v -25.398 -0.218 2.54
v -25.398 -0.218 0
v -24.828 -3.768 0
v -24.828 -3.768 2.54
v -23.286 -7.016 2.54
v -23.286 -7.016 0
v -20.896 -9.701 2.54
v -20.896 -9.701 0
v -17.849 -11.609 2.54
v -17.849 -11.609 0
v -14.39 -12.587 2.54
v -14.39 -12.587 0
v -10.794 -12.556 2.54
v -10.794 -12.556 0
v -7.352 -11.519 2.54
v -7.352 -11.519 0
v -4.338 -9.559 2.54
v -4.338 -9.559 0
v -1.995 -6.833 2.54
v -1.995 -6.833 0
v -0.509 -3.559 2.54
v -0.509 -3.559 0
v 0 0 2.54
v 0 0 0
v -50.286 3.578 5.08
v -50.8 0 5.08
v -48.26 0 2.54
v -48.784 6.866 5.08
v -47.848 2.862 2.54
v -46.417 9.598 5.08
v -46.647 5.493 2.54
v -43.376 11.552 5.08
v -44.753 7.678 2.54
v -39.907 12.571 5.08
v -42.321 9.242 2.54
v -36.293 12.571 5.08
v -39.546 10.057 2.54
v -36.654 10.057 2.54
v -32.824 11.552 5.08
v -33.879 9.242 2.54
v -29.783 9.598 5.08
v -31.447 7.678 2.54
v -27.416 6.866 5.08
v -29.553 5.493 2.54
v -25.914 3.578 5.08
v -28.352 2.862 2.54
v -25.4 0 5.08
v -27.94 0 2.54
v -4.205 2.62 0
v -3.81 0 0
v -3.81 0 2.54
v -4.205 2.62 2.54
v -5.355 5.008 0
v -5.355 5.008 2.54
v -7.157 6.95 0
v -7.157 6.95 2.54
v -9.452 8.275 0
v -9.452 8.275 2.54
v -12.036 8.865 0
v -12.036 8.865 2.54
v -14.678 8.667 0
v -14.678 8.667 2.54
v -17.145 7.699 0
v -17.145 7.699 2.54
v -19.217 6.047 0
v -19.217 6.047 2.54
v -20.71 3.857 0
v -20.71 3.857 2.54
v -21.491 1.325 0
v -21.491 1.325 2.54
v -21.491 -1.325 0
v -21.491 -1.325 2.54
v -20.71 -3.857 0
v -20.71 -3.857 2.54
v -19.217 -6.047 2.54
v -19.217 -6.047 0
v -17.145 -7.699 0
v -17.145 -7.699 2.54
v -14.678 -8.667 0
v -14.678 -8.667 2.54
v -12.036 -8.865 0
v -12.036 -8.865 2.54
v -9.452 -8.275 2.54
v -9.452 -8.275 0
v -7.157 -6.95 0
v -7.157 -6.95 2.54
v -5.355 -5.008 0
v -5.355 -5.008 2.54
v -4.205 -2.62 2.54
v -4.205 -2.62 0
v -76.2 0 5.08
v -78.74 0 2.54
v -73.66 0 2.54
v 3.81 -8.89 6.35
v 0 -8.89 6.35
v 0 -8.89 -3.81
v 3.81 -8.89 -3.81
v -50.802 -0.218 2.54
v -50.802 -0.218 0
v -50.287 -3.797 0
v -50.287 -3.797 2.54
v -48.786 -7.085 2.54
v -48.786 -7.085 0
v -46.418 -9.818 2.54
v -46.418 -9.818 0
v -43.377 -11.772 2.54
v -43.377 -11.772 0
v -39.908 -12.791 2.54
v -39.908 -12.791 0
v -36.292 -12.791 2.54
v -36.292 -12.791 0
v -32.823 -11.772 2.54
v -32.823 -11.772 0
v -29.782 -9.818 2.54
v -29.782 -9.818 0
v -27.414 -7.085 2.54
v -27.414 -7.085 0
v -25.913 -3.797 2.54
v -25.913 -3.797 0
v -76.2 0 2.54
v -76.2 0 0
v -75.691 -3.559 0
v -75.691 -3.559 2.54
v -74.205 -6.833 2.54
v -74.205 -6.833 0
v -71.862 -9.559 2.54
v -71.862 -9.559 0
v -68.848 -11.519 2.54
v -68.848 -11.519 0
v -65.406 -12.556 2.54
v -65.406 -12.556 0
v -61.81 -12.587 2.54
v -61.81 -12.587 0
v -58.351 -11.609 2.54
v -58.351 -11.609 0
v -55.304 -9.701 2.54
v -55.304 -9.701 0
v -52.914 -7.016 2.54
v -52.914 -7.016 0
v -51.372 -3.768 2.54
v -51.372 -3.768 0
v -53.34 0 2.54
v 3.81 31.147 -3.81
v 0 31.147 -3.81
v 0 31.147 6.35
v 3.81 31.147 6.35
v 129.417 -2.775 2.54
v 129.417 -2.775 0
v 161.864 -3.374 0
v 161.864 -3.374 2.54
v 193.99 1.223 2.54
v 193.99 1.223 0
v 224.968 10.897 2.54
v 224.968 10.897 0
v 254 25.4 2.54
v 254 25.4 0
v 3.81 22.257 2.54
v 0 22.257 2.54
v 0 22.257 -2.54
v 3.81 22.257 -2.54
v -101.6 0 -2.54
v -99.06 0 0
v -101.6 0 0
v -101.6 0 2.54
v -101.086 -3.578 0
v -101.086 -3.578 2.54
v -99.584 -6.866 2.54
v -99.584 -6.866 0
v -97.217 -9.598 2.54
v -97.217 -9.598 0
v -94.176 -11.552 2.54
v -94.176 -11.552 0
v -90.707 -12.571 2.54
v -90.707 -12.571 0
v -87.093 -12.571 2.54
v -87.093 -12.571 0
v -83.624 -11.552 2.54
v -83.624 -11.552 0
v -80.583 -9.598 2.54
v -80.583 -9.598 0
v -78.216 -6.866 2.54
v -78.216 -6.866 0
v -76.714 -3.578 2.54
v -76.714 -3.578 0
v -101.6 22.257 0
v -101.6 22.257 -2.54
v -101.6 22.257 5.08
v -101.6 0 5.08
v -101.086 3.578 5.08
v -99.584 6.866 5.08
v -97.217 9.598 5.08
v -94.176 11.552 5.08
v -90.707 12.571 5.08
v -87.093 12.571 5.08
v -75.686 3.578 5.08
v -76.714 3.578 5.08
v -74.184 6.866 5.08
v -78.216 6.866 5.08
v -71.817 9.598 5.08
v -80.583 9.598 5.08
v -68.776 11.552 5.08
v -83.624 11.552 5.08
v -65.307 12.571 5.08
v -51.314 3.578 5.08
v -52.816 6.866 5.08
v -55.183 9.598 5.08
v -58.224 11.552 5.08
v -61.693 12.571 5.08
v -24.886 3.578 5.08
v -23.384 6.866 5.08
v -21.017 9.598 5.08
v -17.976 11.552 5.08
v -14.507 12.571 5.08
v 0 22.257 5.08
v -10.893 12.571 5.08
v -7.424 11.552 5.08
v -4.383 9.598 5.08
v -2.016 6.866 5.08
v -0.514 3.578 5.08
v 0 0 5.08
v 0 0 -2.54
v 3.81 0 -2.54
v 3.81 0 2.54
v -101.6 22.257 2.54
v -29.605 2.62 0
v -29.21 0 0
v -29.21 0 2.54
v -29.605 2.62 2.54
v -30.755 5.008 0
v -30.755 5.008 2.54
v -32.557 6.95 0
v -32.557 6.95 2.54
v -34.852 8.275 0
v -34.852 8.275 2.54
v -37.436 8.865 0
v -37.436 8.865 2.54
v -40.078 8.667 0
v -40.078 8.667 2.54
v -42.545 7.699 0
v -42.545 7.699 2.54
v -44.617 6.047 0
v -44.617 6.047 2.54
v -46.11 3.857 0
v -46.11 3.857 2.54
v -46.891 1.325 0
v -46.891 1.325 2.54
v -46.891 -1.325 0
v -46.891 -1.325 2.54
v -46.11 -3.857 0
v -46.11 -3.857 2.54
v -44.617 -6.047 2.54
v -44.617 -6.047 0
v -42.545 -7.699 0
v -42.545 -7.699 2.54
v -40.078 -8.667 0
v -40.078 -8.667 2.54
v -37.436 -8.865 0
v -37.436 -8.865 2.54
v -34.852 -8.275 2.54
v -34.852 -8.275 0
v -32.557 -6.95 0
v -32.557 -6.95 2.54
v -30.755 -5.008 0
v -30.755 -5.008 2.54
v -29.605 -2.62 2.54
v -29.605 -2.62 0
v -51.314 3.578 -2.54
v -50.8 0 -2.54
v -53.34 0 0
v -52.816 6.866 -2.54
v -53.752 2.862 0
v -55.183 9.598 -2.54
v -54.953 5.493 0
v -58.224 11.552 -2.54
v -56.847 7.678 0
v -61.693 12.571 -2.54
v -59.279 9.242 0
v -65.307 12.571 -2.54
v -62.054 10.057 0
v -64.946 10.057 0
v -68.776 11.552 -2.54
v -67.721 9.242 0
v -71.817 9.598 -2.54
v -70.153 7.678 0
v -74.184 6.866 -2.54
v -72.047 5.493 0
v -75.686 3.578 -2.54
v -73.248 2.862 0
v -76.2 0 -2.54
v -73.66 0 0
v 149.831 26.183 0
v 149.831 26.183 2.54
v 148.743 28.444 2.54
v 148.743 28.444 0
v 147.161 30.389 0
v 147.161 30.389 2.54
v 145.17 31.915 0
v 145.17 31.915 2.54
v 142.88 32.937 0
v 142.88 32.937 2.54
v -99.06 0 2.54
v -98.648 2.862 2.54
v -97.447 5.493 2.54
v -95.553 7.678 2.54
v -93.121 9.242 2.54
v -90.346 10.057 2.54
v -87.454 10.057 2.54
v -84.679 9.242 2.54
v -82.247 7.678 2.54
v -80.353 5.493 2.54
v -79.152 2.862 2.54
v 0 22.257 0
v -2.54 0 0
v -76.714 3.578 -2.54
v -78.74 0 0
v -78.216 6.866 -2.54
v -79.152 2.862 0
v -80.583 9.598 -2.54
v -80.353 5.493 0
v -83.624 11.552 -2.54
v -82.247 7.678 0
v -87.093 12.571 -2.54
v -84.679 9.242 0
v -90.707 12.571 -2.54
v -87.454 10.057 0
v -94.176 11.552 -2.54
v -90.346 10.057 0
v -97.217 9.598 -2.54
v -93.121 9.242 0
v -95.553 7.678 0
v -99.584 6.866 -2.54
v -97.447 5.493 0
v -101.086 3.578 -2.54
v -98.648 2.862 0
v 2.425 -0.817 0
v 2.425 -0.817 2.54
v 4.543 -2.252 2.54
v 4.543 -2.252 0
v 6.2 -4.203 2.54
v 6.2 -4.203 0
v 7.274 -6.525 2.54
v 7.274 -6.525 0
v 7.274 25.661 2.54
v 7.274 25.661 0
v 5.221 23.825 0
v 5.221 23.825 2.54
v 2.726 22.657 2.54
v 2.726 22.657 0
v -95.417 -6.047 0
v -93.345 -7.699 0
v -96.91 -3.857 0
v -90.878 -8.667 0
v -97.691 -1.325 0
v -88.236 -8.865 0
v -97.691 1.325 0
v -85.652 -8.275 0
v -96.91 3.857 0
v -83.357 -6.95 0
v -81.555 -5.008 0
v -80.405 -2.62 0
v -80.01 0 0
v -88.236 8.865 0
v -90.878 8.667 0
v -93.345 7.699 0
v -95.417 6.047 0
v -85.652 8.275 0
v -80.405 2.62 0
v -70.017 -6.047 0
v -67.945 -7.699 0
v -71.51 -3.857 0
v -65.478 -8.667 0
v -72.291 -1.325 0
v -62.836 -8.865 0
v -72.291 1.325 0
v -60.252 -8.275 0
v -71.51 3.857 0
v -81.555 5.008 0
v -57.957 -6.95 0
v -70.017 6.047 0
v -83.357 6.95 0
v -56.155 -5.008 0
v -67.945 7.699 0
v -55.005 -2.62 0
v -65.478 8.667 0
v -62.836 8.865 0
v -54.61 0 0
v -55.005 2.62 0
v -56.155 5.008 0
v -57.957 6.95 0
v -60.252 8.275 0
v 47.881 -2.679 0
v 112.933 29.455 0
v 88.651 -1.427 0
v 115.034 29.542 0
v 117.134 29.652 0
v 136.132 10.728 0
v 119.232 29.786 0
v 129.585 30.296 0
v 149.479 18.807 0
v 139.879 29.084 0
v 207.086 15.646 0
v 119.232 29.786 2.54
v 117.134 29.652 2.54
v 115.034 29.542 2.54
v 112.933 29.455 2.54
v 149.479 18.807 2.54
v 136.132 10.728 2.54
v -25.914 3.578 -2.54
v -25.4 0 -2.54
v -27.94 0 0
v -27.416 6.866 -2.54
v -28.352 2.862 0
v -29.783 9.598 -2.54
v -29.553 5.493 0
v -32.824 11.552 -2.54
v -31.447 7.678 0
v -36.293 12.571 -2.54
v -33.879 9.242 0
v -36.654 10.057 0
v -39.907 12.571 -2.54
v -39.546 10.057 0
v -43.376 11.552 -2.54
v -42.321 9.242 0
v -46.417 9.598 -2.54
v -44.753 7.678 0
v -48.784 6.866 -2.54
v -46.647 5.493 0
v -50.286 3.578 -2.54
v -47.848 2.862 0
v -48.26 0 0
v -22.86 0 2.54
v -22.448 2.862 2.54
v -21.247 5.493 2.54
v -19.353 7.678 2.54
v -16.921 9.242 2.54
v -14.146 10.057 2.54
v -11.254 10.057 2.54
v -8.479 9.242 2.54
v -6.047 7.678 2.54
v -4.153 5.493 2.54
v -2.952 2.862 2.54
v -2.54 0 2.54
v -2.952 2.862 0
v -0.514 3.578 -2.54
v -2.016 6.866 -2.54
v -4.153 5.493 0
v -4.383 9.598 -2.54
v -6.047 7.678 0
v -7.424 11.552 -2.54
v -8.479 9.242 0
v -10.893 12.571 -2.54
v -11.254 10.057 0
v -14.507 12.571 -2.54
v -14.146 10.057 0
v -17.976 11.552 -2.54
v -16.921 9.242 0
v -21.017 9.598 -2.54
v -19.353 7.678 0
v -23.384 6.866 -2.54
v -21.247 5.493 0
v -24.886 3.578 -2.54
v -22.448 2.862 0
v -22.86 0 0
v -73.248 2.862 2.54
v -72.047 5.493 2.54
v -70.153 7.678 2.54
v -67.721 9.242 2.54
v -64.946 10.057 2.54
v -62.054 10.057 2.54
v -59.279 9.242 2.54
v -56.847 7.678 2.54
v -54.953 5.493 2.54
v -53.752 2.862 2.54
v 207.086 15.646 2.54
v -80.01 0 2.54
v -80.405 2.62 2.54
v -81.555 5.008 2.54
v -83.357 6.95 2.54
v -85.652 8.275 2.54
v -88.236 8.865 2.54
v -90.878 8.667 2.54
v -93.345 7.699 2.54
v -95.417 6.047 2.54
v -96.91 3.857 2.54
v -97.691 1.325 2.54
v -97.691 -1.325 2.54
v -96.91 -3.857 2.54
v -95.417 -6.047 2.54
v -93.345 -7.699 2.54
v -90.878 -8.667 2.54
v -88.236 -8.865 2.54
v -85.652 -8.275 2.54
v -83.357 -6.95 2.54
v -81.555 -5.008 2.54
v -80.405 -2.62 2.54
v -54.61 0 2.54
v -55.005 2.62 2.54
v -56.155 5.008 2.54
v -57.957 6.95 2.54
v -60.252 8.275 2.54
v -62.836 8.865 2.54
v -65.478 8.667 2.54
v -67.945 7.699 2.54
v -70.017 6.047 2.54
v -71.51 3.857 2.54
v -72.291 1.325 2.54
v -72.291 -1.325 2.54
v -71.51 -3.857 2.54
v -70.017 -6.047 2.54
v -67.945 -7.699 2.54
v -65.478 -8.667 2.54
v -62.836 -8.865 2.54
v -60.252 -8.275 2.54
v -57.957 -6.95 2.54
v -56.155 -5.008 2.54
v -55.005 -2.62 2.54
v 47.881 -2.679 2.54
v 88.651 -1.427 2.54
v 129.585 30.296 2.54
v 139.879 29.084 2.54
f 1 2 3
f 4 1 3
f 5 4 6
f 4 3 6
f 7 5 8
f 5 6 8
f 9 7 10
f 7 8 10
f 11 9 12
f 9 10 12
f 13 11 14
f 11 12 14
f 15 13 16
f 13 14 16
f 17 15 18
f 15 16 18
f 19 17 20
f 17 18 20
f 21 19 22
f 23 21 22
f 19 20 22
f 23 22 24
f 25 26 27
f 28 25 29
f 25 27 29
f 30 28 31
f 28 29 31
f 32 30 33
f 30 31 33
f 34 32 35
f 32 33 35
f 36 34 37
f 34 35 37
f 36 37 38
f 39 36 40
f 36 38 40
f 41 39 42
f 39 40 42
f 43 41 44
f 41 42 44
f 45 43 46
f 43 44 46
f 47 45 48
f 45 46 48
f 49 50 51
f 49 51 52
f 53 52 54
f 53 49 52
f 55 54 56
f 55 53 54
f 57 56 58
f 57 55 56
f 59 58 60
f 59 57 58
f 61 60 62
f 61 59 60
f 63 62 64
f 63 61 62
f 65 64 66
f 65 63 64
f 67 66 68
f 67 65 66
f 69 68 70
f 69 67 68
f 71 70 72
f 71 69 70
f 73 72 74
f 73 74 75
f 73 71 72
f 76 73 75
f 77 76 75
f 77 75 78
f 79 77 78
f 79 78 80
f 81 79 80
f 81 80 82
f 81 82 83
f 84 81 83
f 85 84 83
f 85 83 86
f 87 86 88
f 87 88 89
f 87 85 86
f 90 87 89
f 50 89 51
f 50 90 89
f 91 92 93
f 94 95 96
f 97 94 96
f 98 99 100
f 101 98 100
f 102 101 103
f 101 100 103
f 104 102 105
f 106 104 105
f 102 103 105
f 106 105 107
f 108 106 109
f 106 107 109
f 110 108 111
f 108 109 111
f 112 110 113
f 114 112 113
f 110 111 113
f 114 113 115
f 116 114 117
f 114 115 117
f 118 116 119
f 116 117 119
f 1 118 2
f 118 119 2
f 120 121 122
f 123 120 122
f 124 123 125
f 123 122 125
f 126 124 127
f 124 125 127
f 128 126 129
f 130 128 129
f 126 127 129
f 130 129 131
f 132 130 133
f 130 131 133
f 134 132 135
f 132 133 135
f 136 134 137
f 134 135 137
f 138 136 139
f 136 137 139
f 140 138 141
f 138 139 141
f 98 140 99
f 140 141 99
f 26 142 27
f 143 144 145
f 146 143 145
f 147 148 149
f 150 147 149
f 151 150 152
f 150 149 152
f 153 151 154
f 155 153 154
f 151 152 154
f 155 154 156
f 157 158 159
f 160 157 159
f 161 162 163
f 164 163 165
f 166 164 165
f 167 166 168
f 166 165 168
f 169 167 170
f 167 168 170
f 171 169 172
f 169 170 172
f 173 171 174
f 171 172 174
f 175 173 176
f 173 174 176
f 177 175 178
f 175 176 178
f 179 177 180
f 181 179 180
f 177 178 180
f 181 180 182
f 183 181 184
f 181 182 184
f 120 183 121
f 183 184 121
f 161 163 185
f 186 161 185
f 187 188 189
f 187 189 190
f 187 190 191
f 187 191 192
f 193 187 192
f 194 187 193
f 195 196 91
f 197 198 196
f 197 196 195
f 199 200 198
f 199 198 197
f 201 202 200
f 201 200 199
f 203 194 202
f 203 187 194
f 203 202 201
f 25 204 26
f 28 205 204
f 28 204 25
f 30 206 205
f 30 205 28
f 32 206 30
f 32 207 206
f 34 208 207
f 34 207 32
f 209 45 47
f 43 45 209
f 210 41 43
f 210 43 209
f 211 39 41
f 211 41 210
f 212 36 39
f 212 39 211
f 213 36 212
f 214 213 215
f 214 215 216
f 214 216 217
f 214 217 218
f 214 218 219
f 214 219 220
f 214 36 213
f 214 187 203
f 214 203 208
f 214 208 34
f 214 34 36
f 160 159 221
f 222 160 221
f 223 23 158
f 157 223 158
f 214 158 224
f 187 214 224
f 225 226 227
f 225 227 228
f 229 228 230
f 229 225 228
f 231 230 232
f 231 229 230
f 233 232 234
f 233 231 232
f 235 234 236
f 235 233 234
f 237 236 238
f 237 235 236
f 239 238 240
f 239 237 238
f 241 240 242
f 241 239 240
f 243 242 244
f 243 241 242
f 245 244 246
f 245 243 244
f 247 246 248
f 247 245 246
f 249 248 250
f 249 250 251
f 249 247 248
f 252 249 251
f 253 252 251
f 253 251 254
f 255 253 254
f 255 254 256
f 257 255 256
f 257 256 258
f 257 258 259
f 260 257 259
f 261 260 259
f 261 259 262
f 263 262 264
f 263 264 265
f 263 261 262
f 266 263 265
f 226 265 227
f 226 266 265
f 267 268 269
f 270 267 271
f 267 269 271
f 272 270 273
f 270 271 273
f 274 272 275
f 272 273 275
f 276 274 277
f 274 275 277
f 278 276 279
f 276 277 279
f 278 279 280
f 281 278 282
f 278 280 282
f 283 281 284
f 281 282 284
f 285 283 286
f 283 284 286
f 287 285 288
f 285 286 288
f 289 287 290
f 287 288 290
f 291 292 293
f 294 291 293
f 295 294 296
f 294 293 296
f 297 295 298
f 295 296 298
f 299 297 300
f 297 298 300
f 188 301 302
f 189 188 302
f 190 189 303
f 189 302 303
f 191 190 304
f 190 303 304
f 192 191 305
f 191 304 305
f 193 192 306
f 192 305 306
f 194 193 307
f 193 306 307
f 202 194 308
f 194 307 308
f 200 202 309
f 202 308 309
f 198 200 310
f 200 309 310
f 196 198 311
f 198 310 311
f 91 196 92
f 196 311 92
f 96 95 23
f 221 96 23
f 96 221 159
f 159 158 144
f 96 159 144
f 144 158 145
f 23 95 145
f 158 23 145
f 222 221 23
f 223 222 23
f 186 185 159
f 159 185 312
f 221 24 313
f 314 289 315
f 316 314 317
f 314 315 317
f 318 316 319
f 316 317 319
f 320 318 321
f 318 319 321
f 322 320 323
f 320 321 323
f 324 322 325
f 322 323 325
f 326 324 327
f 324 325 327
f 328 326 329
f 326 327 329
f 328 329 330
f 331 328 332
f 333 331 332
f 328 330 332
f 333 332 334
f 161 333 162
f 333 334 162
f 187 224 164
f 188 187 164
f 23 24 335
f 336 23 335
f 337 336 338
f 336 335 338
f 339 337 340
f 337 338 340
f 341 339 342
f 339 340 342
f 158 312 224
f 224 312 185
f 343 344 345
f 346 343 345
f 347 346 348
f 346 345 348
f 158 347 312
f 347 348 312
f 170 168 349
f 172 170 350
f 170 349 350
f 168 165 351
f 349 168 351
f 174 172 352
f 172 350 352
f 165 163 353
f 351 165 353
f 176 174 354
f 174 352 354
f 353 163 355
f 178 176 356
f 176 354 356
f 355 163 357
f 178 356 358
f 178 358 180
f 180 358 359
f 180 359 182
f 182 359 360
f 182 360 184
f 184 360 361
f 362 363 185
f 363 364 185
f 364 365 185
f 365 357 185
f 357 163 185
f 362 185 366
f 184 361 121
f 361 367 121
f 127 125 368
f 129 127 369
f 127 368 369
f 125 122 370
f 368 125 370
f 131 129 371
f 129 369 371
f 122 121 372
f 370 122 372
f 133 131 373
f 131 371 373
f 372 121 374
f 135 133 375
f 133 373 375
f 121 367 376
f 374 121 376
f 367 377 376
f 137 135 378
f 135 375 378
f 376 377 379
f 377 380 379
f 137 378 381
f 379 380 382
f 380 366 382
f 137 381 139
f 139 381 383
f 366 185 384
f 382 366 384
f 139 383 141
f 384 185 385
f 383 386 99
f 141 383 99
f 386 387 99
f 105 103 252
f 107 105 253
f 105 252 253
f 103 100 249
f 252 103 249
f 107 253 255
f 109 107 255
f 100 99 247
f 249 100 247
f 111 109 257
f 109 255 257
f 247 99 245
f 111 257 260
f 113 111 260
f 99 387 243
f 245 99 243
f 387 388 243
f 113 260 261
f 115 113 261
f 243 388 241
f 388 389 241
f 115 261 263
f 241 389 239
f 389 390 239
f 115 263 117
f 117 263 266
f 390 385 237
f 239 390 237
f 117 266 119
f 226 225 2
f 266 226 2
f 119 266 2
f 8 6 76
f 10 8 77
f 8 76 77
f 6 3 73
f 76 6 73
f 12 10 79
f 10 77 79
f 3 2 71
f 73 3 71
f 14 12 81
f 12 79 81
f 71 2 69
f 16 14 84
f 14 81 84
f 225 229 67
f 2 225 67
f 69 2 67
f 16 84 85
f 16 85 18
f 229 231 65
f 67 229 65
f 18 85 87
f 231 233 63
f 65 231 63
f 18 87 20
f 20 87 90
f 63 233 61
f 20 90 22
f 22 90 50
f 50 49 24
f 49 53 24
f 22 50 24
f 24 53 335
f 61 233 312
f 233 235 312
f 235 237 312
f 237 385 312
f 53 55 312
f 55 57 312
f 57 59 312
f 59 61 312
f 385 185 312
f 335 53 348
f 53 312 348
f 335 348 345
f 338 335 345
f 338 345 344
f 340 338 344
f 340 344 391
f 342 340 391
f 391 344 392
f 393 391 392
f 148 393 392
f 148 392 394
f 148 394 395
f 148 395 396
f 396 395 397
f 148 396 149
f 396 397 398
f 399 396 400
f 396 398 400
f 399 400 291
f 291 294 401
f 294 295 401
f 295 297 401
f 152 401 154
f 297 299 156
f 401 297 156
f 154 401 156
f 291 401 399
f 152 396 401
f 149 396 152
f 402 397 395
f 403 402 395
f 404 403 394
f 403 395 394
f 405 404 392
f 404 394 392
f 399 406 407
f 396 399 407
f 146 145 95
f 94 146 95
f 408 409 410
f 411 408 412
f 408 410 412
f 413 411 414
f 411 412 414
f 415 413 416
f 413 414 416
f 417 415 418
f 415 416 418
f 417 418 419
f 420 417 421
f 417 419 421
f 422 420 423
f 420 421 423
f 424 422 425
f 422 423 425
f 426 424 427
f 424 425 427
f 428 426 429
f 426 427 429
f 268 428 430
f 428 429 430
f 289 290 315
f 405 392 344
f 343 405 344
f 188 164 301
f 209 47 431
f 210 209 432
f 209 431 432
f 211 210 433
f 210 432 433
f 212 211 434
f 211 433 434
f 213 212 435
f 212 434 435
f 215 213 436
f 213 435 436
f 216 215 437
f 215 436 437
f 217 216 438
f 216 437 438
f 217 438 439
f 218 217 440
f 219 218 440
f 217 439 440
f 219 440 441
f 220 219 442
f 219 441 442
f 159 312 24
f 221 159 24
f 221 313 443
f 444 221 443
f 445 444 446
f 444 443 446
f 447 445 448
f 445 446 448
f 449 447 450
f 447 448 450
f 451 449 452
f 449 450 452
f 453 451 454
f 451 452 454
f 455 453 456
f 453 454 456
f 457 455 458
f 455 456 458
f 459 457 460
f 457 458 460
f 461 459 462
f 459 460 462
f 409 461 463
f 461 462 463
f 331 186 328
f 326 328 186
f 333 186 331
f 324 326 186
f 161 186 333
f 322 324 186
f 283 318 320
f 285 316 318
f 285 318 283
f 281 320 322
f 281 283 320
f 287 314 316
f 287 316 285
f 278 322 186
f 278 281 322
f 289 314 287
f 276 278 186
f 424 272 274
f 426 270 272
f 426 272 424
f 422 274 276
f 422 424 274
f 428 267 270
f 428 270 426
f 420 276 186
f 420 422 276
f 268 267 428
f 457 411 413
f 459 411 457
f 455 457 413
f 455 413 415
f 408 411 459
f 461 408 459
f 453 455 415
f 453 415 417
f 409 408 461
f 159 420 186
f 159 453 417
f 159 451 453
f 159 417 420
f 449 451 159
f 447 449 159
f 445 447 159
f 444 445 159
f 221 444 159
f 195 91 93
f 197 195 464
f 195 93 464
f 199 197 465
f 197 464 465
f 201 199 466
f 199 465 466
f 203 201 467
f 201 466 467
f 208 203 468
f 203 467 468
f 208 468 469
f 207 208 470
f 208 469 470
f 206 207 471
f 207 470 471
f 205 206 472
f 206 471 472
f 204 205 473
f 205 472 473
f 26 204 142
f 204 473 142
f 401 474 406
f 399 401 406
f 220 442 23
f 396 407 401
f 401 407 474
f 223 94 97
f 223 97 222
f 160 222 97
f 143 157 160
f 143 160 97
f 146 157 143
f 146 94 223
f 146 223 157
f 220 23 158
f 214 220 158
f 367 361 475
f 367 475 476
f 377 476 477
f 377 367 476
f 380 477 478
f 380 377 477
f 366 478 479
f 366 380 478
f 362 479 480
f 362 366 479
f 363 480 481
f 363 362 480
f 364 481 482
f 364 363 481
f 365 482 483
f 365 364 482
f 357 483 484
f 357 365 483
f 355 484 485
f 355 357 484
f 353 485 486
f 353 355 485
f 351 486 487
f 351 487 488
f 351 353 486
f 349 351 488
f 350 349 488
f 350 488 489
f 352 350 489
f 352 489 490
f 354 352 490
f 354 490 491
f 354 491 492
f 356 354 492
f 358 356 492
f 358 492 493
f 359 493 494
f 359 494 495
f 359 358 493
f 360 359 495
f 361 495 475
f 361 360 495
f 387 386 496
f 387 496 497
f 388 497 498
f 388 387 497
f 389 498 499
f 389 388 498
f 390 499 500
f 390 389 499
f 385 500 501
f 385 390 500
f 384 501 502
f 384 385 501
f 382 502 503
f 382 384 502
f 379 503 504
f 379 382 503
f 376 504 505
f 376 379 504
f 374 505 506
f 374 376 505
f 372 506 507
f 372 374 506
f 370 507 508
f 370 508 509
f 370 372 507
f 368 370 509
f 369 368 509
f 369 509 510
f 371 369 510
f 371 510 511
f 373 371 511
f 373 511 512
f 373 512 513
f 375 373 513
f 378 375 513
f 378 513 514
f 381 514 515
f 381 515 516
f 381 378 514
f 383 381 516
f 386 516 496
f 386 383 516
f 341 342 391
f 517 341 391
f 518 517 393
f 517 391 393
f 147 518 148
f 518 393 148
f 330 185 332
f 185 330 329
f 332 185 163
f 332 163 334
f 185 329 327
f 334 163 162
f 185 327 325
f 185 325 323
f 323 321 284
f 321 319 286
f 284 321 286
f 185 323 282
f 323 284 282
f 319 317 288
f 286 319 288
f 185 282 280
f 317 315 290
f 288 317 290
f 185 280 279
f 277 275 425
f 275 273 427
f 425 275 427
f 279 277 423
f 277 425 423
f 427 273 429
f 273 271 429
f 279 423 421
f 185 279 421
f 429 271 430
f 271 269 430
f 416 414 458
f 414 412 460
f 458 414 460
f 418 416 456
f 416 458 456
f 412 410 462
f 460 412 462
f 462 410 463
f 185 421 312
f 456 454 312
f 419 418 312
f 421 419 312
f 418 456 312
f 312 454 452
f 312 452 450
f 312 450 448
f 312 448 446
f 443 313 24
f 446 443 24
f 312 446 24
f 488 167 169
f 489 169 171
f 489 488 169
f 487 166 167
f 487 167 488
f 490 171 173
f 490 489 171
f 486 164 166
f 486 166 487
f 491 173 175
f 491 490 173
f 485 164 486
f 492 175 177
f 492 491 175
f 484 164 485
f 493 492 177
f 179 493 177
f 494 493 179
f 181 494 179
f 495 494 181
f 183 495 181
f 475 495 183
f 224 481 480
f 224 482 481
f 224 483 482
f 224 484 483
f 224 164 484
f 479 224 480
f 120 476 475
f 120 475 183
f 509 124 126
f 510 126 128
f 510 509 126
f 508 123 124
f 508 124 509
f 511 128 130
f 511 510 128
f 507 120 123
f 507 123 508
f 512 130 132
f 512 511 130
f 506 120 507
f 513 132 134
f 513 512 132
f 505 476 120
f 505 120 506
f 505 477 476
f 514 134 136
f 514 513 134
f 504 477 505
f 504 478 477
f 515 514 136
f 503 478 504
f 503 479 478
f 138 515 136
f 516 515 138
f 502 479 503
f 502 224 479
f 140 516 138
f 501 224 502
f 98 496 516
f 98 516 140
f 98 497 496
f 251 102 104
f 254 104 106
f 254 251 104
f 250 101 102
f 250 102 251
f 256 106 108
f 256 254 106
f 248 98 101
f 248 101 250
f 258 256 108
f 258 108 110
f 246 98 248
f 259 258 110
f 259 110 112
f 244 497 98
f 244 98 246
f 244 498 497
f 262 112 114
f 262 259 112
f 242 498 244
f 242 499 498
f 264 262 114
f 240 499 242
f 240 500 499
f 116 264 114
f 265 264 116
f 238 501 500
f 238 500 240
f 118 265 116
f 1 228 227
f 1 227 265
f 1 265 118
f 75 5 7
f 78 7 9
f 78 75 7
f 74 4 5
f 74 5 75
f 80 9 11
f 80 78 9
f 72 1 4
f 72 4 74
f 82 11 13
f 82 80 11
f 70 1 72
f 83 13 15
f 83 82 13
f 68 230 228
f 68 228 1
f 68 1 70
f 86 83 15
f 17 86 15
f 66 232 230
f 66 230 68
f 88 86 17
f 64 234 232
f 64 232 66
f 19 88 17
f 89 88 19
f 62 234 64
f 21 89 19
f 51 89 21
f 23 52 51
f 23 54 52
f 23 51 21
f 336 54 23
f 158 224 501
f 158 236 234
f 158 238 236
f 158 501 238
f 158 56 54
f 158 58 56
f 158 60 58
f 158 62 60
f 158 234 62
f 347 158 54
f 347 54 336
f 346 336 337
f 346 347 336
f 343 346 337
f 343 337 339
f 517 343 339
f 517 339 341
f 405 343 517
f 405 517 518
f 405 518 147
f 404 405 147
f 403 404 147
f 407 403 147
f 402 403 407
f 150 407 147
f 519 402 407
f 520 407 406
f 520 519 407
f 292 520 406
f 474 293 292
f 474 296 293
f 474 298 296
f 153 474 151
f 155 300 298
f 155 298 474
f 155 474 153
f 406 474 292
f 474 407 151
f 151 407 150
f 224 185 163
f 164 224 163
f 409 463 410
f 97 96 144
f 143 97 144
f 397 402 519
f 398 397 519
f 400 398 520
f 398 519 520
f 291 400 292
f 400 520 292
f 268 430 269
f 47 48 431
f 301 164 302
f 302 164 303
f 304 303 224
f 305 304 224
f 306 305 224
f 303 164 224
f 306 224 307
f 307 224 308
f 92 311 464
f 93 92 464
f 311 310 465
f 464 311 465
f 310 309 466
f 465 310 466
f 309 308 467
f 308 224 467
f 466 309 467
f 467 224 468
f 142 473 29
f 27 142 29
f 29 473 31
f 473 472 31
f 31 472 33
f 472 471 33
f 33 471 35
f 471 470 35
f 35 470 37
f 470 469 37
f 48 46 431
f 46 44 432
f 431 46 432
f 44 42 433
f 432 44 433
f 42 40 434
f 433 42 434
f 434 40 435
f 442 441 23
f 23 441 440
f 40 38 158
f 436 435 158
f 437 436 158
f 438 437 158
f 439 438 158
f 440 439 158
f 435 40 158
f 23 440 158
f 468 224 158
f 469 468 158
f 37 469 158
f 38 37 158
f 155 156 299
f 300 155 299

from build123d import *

# Parameters (mm, degrees)
F0_R          = 8.89
F1_DEPTH      = 2.54
F3_DEPTH      = 25.4
F5_DEPTH      = 2.54
F7_DEPTH      = 2.54
F8_T2_ANGLE   = 306.5001793885
F8_T4_ANGLE   = 306.5001793885
F8_T6_ANGLE   = 306.5001793885
F8_T8_ANGLE   = 306.5001793885
F8_2_T2_ANGLE = 306.5001793885
F8_2_T4_ANGLE = 306.5001793885
F8_2_T6_ANGLE = 306.5001793885
F8_2_T8_ANGLE = 306.5001793885
F10_DEPTH     = 3.81


# Not quite as in the source:
# - a fillet or chamfer that OpenCascade refuses, or shapes differently, is made with other operations: its cross-section is extruded or revolved along the edge and cut away or added


with BuildPart() as f1:
    # F0 (on Top) → F1 (new body)
    with BuildSketch(Plane.XY):
        with BuildLine():
            Line((0, 22.2569602452), (0, 0))
            ThreePointArc((0, 0), (4.5429449248, -2.2524889562), (7.2743112207, -6.5246890036))
            ThreePointArc((7.2743112207, -6.5246890036), (68.2558827077, -1.7283700883), (129.4168248237, -2.7752204279))
            ThreePointArc((129.4168248237, -2.7752204279), (193.990196572, 1.2229597331), (254, 25.4))
            Line((254, 25.4), (142.8799988323, 32.9367792524))
            Line((142.8799988323, 32.9367792524), (119.2322895651, 29.7860647099))
            ThreePointArc((119.2322895651, 29.7860647099), (116.0841208365, 29.5940132977), (112.9331847352, 29.4545436828))
            Line((112.9331847352, 29.4545436828), (7.2743112207, 25.6611633832))
            ThreePointArc((7.2743112207, 25.6611633832), (4.0157254245, 23.1501104869), (0, 22.2569602452))
        make_face()
        with BuildLine():
            ThreePointArc((-25.3981255835, -0.218189517), (-12.5909012159, -12.6995313872), (0, 0))
            Line((0, 0), (0, 22.2569602452))
            Line((0, 22.2569602452), (-34.8408528237, 22.2569602452))
            ThreePointArc((-34.8408528237, 22.2569602452), (-50.8, 21.91440634), (-66.7591471763, 22.2569602452))
            Line((-66.7591471763, 22.2569602452), (-101.6, 22.2569602452))
            Line((-101.6, 22.2569602452), (-101.6, 0))
            ThreePointArc((-101.6, 0), (-88.9, -12.7), (-76.2, 0))
            ThreePointArc((-76.2, 0), (-63.6090987841, -12.6995313872), (-50.8018744165, -0.218189517))
            ThreePointArc((-50.8018744165, -0.218189517), (-38.1, -12.9200800362), (-25.3981255835, -0.218189517))
        make_face()
        with Locations((-88.9, 0)):
            Circle(F0_R, mode=Mode.SUBTRACT)
        with Locations((-63.5, 0)):
            Circle(F0_R, mode=Mode.SUBTRACT)
        with BuildLine():
            ThreePointArc((-50.8, 0), (-50.8004686128, -0.1090987841), (-50.8018744165, -0.218189517))
            ThreePointArc((-50.8018744165, -0.218189517), (-50.8014057346, -0.1090907335), (-50.8, 0))
        make_face(mode=Mode.SUBTRACT)
        with Locations((-38.1, 0)):
            Circle(F0_R, mode=Mode.SUBTRACT)
        with BuildLine():
            ThreePointArc((-25.4, 0), (-25.3985942654, -0.1090907335), (-25.3981255835, -0.218189517))
            ThreePointArc((-25.3981255835, -0.218189517), (-25.3995313872, -0.1090987841), (-25.4, 0))
        make_face(mode=Mode.SUBTRACT)
        with Locations((-12.7, 0)):
            Circle(F0_R, mode=Mode.SUBTRACT)
        with BuildLine():
            ThreePointArc((-66.7591471763, 22.2569602452), (-50.8, 21.91440634), (-34.8408528237, 22.2569602452))
            Line((-34.8408528237, 22.2569602452), (-66.7591471763, 22.2569602452))
        make_face()
        with BuildLine():
            ThreePointArc((-50.8, 0), (-50.8014057346, -0.1090907335), (-50.8018744165, -0.218189517))
            ThreePointArc((-50.8018744165, -0.218189517), (-50.8004686128, -0.1090987841), (-50.8, 0))
        make_face()
        with BuildLine():
            ThreePointArc((-25.4, 0), (-25.3995313872, -0.1090987841), (-25.3981255835, -0.218189517))
            ThreePointArc((-25.3981255835, -0.218189517), (-25.3985942654, -0.1090907335), (-25.4, 0))
        make_face()
    extrude(amount=F1_DEPTH)

    # F2 (on face) → F3 (cut)
    with BuildSketch(Plane.XY.offset(2.54)):
        with BuildLine():
            ThreePointArc((119.2322895651, 29.7860647099), (134.7574672595, 29.9044998636), (149.8305946589, 26.1834785342))
            ThreePointArc((149.8305946589, 26.1834785342), (147.1610546869, 30.3894267459), (142.8799988323, 32.9367792524))
            Line((142.8799988323, 32.9367792524), (119.2322895651, 29.7860647099))
        make_face()
        Polygon((207.085609436, 15.6457461417), (149.4793444872, 18.8070647418), (136.1315399408, 10.7281366363), align=None)
    extrude(amount=-F3_DEPTH, mode=Mode.SUBTRACT)


with BuildPart() as f5:
    # F4 (on face) → F5 (new body)
    with BuildSketch(Plane.XY.offset(2.54)):
        with BuildLine():
            Line((0, 0), (0, 22.2569602452))
            Line((0, 22.2569602452), (-101.6, 22.2569602452))
            Line((-101.6, 22.2569602452), (-101.6, 0))
            Line((-101.6, 0), (-97.79, 0))
            ThreePointArc((-97.79, 0), (-88.9, 8.89), (-80.01, 0))
            Line((-80.01, 0), (-76.2, 0))
            Line((-76.2, 0), (-72.39, 0))
            ThreePointArc((-72.39, 0), (-63.5, 8.89), (-54.61, 0))
            Line((-54.61, 0), (-46.99, 0))
            ThreePointArc((-46.99, 0), (-38.1, 8.89), (-29.21, 0))
            Line((-29.21, 0), (-21.59, 0))
            ThreePointArc((-21.59, 0), (-12.7, 8.89), (-3.81, 0))
            Line((-3.81, 0), (0, 0))
        make_face()
    extrude(amount=F5_DEPTH)

    # F8: chamfer of 3.81 on 4 edges, made by hand

    # F8_s1 → F8_t2 (revolve, cut)
    with BuildSketch(Plane(origin=(-70.8899847432, 35.7313546731, 0), x_dir=(0, 0, 1), z_dir=(0.892979648, -0.4500970431, 0))):
        Polygon((5.08, 52.7136271329), (1.27, 48.9036271329), (5.08, 48.9036271329), align=None)
    revolve(axis=Axis((-88.9, 0, 5.08), (0, 0, -1)), revolution_arc=F8_T2_ANGLE, mode=Mode.SUBTRACT)

    # F8_s3 → F8_t4 (revolve, cut)
    with BuildSketch(Plane(origin=(-50.635703388, 25.5223961951, 0), x_dir=(0, 0, 1), z_dir=(0.892979648, -0.4500970431, 0))):
        Polygon((5.08, 41.2811622378), (1.27, 37.4711622378), (5.08, 37.4711622378), align=None)
    revolve(axis=Axis((-63.5, 0, 5.08), (0, 0, -1)), revolution_arc=F8_T4_ANGLE, mode=Mode.SUBTRACT)

    # F8_s5 → F8_t6 (revolve, cut)
    with BuildSketch(Plane(origin=(-30.3814220328, 15.3134377171, 0), x_dir=(0, 0, 1), z_dir=(0.892979648, -0.4500970431, 0))):
        Polygon((5.08, 29.8486973427), (1.27, 26.0386973427), (5.08, 26.0386973427), align=None)
    revolve(axis=Axis((-38.1, 0, 5.08), (0, 0, -1)), revolution_arc=F8_T6_ANGLE, mode=Mode.SUBTRACT)

    # F8_s7 → F8_t8 (revolve, cut)
    with BuildSketch(Plane(origin=(-10.1271406776, 5.104479239, 0), x_dir=(0, 0, 1), z_dir=(0.892979648, -0.4500970431, 0))):
        Polygon((5.08, 18.4162324476), (1.27, 14.6062324476), (5.08, 14.6062324476), align=None)
    revolve(axis=Axis((-12.7, 0, 5.08), (0, 0, -1)), revolution_arc=F8_T8_ANGLE, mode=Mode.SUBTRACT)


with BuildPart() as f7:
    # F6 (on face) → F7 (new body)
    with BuildSketch(Plane(origin=(0, 0, 0), x_dir=(1, 0, 0), z_dir=(0, 0, -1))):
        with BuildLine():
            Line((-101.6, -22.2569602452), (0, -22.2569602452))
            Line((0, -22.2569602452), (0, 0))
            Line((0, 0), (-3.81, 0))
            ThreePointArc((-3.81, 0), (-12.7, -8.89), (-21.59, 0))
            Line((-21.59, 0), (-29.21, 0))
            ThreePointArc((-29.21, 0), (-38.1, -8.89), (-46.99, 0))
            Line((-46.99, 0), (-54.61, 0))
            ThreePointArc((-54.61, 0), (-63.5, -8.89), (-72.39, 0))
            Line((-72.39, 0), (-76.2, 0))
            Line((-76.2, 0), (-80.01, 0))
            ThreePointArc((-80.01, 0), (-88.9, -8.89), (-97.79, 0))
            Line((-97.79, 0), (-101.6, 0))
            Line((-101.6, 0), (-101.6, -22.2569602452))
        make_face()
    extrude(amount=F7_DEPTH)

    # F8#2: chamfer of 3.81 on 4 edges, made by hand

    # F8_2_s1 → F8_2_t2 (revolve, cut)
    with BuildSketch(Plane(origin=(-30.3814220328, -15.3134377171, 0), x_dir=(0, 0, 1), z_dir=(-0.892979648, -0.4500970431, 0))):
        Polygon((-2.54, 4.4486973427), (1.27, 8.2586973427), (-2.54, 8.2586973427), align=None)
    revolve(axis=Axis((-38.1, 0, -2.54), (0, 0, 1)), revolution_arc=F8_2_T2_ANGLE, mode=Mode.SUBTRACT)

    # F8_2_s3 → F8_2_t4 (revolve, cut)
    with BuildSketch(Plane(origin=(-10.1271406776, -5.104479239, 0), x_dir=(0, 0, 1), z_dir=(-0.892979648, -0.4500970431, 0))):
        Polygon((-2.54, -6.9837675524), (1.27, -3.1737675524), (-2.54, -3.1737675524), align=None)
    revolve(axis=Axis((-12.7, 0, -2.54), (0, 0, 1)), revolution_arc=F8_2_T4_ANGLE, mode=Mode.SUBTRACT)

    # F8_2_s5 → F8_2_t6 (revolve, cut)
    with BuildSketch(Plane(origin=(-50.635703388, -25.5223961951, 0), x_dir=(0, 0, 1), z_dir=(-0.892979648, -0.4500970431, 0))):
        Polygon((-2.54, 15.8811622378), (1.27, 19.6911622378), (-2.54, 19.6911622378), align=None)
    revolve(axis=Axis((-63.5, 0, -2.54), (0, 0, 1)), revolution_arc=F8_2_T6_ANGLE, mode=Mode.SUBTRACT)

    # F8_2_s7 → F8_2_t8 (revolve, cut)
    with BuildSketch(Plane(origin=(-70.8899847432, -35.7313546731, 0), x_dir=(0, 0, 1), z_dir=(-0.892979648, -0.4500970431, 0))):
        Polygon((-2.54, 27.3136271329), (1.27, 31.1236271329), (-2.54, 31.1236271329), align=None)
    revolve(axis=Axis((-88.9, 0, -2.54), (0, 0, 1)), revolution_arc=F8_2_T8_ANGLE, mode=Mode.SUBTRACT)


with BuildPart() as f10:
    # F9 (on face) → F10 (new body)
    with BuildSketch(Plane.YZ):
        Polygon((0, -3.81), (22.2569602452, -3.81), (31.1469602452, -3.81), (31.1469602452, 6.35), (22.2569602452, 6.35), (0, 6.35), (-8.89, 6.35), (-8.89, -3.81), align=None)
        Polygon((22.2569602452, 2.54), (22.2569602452, 0), (22.2569602452, -2.54), (0, -2.54), (0, 0), (0, 2.54), align=None, mode=Mode.SUBTRACT)
    extrude(amount=F10_DEPTH)


solid = Compound([f1.part, f5.part, f7.part, f10.part])
